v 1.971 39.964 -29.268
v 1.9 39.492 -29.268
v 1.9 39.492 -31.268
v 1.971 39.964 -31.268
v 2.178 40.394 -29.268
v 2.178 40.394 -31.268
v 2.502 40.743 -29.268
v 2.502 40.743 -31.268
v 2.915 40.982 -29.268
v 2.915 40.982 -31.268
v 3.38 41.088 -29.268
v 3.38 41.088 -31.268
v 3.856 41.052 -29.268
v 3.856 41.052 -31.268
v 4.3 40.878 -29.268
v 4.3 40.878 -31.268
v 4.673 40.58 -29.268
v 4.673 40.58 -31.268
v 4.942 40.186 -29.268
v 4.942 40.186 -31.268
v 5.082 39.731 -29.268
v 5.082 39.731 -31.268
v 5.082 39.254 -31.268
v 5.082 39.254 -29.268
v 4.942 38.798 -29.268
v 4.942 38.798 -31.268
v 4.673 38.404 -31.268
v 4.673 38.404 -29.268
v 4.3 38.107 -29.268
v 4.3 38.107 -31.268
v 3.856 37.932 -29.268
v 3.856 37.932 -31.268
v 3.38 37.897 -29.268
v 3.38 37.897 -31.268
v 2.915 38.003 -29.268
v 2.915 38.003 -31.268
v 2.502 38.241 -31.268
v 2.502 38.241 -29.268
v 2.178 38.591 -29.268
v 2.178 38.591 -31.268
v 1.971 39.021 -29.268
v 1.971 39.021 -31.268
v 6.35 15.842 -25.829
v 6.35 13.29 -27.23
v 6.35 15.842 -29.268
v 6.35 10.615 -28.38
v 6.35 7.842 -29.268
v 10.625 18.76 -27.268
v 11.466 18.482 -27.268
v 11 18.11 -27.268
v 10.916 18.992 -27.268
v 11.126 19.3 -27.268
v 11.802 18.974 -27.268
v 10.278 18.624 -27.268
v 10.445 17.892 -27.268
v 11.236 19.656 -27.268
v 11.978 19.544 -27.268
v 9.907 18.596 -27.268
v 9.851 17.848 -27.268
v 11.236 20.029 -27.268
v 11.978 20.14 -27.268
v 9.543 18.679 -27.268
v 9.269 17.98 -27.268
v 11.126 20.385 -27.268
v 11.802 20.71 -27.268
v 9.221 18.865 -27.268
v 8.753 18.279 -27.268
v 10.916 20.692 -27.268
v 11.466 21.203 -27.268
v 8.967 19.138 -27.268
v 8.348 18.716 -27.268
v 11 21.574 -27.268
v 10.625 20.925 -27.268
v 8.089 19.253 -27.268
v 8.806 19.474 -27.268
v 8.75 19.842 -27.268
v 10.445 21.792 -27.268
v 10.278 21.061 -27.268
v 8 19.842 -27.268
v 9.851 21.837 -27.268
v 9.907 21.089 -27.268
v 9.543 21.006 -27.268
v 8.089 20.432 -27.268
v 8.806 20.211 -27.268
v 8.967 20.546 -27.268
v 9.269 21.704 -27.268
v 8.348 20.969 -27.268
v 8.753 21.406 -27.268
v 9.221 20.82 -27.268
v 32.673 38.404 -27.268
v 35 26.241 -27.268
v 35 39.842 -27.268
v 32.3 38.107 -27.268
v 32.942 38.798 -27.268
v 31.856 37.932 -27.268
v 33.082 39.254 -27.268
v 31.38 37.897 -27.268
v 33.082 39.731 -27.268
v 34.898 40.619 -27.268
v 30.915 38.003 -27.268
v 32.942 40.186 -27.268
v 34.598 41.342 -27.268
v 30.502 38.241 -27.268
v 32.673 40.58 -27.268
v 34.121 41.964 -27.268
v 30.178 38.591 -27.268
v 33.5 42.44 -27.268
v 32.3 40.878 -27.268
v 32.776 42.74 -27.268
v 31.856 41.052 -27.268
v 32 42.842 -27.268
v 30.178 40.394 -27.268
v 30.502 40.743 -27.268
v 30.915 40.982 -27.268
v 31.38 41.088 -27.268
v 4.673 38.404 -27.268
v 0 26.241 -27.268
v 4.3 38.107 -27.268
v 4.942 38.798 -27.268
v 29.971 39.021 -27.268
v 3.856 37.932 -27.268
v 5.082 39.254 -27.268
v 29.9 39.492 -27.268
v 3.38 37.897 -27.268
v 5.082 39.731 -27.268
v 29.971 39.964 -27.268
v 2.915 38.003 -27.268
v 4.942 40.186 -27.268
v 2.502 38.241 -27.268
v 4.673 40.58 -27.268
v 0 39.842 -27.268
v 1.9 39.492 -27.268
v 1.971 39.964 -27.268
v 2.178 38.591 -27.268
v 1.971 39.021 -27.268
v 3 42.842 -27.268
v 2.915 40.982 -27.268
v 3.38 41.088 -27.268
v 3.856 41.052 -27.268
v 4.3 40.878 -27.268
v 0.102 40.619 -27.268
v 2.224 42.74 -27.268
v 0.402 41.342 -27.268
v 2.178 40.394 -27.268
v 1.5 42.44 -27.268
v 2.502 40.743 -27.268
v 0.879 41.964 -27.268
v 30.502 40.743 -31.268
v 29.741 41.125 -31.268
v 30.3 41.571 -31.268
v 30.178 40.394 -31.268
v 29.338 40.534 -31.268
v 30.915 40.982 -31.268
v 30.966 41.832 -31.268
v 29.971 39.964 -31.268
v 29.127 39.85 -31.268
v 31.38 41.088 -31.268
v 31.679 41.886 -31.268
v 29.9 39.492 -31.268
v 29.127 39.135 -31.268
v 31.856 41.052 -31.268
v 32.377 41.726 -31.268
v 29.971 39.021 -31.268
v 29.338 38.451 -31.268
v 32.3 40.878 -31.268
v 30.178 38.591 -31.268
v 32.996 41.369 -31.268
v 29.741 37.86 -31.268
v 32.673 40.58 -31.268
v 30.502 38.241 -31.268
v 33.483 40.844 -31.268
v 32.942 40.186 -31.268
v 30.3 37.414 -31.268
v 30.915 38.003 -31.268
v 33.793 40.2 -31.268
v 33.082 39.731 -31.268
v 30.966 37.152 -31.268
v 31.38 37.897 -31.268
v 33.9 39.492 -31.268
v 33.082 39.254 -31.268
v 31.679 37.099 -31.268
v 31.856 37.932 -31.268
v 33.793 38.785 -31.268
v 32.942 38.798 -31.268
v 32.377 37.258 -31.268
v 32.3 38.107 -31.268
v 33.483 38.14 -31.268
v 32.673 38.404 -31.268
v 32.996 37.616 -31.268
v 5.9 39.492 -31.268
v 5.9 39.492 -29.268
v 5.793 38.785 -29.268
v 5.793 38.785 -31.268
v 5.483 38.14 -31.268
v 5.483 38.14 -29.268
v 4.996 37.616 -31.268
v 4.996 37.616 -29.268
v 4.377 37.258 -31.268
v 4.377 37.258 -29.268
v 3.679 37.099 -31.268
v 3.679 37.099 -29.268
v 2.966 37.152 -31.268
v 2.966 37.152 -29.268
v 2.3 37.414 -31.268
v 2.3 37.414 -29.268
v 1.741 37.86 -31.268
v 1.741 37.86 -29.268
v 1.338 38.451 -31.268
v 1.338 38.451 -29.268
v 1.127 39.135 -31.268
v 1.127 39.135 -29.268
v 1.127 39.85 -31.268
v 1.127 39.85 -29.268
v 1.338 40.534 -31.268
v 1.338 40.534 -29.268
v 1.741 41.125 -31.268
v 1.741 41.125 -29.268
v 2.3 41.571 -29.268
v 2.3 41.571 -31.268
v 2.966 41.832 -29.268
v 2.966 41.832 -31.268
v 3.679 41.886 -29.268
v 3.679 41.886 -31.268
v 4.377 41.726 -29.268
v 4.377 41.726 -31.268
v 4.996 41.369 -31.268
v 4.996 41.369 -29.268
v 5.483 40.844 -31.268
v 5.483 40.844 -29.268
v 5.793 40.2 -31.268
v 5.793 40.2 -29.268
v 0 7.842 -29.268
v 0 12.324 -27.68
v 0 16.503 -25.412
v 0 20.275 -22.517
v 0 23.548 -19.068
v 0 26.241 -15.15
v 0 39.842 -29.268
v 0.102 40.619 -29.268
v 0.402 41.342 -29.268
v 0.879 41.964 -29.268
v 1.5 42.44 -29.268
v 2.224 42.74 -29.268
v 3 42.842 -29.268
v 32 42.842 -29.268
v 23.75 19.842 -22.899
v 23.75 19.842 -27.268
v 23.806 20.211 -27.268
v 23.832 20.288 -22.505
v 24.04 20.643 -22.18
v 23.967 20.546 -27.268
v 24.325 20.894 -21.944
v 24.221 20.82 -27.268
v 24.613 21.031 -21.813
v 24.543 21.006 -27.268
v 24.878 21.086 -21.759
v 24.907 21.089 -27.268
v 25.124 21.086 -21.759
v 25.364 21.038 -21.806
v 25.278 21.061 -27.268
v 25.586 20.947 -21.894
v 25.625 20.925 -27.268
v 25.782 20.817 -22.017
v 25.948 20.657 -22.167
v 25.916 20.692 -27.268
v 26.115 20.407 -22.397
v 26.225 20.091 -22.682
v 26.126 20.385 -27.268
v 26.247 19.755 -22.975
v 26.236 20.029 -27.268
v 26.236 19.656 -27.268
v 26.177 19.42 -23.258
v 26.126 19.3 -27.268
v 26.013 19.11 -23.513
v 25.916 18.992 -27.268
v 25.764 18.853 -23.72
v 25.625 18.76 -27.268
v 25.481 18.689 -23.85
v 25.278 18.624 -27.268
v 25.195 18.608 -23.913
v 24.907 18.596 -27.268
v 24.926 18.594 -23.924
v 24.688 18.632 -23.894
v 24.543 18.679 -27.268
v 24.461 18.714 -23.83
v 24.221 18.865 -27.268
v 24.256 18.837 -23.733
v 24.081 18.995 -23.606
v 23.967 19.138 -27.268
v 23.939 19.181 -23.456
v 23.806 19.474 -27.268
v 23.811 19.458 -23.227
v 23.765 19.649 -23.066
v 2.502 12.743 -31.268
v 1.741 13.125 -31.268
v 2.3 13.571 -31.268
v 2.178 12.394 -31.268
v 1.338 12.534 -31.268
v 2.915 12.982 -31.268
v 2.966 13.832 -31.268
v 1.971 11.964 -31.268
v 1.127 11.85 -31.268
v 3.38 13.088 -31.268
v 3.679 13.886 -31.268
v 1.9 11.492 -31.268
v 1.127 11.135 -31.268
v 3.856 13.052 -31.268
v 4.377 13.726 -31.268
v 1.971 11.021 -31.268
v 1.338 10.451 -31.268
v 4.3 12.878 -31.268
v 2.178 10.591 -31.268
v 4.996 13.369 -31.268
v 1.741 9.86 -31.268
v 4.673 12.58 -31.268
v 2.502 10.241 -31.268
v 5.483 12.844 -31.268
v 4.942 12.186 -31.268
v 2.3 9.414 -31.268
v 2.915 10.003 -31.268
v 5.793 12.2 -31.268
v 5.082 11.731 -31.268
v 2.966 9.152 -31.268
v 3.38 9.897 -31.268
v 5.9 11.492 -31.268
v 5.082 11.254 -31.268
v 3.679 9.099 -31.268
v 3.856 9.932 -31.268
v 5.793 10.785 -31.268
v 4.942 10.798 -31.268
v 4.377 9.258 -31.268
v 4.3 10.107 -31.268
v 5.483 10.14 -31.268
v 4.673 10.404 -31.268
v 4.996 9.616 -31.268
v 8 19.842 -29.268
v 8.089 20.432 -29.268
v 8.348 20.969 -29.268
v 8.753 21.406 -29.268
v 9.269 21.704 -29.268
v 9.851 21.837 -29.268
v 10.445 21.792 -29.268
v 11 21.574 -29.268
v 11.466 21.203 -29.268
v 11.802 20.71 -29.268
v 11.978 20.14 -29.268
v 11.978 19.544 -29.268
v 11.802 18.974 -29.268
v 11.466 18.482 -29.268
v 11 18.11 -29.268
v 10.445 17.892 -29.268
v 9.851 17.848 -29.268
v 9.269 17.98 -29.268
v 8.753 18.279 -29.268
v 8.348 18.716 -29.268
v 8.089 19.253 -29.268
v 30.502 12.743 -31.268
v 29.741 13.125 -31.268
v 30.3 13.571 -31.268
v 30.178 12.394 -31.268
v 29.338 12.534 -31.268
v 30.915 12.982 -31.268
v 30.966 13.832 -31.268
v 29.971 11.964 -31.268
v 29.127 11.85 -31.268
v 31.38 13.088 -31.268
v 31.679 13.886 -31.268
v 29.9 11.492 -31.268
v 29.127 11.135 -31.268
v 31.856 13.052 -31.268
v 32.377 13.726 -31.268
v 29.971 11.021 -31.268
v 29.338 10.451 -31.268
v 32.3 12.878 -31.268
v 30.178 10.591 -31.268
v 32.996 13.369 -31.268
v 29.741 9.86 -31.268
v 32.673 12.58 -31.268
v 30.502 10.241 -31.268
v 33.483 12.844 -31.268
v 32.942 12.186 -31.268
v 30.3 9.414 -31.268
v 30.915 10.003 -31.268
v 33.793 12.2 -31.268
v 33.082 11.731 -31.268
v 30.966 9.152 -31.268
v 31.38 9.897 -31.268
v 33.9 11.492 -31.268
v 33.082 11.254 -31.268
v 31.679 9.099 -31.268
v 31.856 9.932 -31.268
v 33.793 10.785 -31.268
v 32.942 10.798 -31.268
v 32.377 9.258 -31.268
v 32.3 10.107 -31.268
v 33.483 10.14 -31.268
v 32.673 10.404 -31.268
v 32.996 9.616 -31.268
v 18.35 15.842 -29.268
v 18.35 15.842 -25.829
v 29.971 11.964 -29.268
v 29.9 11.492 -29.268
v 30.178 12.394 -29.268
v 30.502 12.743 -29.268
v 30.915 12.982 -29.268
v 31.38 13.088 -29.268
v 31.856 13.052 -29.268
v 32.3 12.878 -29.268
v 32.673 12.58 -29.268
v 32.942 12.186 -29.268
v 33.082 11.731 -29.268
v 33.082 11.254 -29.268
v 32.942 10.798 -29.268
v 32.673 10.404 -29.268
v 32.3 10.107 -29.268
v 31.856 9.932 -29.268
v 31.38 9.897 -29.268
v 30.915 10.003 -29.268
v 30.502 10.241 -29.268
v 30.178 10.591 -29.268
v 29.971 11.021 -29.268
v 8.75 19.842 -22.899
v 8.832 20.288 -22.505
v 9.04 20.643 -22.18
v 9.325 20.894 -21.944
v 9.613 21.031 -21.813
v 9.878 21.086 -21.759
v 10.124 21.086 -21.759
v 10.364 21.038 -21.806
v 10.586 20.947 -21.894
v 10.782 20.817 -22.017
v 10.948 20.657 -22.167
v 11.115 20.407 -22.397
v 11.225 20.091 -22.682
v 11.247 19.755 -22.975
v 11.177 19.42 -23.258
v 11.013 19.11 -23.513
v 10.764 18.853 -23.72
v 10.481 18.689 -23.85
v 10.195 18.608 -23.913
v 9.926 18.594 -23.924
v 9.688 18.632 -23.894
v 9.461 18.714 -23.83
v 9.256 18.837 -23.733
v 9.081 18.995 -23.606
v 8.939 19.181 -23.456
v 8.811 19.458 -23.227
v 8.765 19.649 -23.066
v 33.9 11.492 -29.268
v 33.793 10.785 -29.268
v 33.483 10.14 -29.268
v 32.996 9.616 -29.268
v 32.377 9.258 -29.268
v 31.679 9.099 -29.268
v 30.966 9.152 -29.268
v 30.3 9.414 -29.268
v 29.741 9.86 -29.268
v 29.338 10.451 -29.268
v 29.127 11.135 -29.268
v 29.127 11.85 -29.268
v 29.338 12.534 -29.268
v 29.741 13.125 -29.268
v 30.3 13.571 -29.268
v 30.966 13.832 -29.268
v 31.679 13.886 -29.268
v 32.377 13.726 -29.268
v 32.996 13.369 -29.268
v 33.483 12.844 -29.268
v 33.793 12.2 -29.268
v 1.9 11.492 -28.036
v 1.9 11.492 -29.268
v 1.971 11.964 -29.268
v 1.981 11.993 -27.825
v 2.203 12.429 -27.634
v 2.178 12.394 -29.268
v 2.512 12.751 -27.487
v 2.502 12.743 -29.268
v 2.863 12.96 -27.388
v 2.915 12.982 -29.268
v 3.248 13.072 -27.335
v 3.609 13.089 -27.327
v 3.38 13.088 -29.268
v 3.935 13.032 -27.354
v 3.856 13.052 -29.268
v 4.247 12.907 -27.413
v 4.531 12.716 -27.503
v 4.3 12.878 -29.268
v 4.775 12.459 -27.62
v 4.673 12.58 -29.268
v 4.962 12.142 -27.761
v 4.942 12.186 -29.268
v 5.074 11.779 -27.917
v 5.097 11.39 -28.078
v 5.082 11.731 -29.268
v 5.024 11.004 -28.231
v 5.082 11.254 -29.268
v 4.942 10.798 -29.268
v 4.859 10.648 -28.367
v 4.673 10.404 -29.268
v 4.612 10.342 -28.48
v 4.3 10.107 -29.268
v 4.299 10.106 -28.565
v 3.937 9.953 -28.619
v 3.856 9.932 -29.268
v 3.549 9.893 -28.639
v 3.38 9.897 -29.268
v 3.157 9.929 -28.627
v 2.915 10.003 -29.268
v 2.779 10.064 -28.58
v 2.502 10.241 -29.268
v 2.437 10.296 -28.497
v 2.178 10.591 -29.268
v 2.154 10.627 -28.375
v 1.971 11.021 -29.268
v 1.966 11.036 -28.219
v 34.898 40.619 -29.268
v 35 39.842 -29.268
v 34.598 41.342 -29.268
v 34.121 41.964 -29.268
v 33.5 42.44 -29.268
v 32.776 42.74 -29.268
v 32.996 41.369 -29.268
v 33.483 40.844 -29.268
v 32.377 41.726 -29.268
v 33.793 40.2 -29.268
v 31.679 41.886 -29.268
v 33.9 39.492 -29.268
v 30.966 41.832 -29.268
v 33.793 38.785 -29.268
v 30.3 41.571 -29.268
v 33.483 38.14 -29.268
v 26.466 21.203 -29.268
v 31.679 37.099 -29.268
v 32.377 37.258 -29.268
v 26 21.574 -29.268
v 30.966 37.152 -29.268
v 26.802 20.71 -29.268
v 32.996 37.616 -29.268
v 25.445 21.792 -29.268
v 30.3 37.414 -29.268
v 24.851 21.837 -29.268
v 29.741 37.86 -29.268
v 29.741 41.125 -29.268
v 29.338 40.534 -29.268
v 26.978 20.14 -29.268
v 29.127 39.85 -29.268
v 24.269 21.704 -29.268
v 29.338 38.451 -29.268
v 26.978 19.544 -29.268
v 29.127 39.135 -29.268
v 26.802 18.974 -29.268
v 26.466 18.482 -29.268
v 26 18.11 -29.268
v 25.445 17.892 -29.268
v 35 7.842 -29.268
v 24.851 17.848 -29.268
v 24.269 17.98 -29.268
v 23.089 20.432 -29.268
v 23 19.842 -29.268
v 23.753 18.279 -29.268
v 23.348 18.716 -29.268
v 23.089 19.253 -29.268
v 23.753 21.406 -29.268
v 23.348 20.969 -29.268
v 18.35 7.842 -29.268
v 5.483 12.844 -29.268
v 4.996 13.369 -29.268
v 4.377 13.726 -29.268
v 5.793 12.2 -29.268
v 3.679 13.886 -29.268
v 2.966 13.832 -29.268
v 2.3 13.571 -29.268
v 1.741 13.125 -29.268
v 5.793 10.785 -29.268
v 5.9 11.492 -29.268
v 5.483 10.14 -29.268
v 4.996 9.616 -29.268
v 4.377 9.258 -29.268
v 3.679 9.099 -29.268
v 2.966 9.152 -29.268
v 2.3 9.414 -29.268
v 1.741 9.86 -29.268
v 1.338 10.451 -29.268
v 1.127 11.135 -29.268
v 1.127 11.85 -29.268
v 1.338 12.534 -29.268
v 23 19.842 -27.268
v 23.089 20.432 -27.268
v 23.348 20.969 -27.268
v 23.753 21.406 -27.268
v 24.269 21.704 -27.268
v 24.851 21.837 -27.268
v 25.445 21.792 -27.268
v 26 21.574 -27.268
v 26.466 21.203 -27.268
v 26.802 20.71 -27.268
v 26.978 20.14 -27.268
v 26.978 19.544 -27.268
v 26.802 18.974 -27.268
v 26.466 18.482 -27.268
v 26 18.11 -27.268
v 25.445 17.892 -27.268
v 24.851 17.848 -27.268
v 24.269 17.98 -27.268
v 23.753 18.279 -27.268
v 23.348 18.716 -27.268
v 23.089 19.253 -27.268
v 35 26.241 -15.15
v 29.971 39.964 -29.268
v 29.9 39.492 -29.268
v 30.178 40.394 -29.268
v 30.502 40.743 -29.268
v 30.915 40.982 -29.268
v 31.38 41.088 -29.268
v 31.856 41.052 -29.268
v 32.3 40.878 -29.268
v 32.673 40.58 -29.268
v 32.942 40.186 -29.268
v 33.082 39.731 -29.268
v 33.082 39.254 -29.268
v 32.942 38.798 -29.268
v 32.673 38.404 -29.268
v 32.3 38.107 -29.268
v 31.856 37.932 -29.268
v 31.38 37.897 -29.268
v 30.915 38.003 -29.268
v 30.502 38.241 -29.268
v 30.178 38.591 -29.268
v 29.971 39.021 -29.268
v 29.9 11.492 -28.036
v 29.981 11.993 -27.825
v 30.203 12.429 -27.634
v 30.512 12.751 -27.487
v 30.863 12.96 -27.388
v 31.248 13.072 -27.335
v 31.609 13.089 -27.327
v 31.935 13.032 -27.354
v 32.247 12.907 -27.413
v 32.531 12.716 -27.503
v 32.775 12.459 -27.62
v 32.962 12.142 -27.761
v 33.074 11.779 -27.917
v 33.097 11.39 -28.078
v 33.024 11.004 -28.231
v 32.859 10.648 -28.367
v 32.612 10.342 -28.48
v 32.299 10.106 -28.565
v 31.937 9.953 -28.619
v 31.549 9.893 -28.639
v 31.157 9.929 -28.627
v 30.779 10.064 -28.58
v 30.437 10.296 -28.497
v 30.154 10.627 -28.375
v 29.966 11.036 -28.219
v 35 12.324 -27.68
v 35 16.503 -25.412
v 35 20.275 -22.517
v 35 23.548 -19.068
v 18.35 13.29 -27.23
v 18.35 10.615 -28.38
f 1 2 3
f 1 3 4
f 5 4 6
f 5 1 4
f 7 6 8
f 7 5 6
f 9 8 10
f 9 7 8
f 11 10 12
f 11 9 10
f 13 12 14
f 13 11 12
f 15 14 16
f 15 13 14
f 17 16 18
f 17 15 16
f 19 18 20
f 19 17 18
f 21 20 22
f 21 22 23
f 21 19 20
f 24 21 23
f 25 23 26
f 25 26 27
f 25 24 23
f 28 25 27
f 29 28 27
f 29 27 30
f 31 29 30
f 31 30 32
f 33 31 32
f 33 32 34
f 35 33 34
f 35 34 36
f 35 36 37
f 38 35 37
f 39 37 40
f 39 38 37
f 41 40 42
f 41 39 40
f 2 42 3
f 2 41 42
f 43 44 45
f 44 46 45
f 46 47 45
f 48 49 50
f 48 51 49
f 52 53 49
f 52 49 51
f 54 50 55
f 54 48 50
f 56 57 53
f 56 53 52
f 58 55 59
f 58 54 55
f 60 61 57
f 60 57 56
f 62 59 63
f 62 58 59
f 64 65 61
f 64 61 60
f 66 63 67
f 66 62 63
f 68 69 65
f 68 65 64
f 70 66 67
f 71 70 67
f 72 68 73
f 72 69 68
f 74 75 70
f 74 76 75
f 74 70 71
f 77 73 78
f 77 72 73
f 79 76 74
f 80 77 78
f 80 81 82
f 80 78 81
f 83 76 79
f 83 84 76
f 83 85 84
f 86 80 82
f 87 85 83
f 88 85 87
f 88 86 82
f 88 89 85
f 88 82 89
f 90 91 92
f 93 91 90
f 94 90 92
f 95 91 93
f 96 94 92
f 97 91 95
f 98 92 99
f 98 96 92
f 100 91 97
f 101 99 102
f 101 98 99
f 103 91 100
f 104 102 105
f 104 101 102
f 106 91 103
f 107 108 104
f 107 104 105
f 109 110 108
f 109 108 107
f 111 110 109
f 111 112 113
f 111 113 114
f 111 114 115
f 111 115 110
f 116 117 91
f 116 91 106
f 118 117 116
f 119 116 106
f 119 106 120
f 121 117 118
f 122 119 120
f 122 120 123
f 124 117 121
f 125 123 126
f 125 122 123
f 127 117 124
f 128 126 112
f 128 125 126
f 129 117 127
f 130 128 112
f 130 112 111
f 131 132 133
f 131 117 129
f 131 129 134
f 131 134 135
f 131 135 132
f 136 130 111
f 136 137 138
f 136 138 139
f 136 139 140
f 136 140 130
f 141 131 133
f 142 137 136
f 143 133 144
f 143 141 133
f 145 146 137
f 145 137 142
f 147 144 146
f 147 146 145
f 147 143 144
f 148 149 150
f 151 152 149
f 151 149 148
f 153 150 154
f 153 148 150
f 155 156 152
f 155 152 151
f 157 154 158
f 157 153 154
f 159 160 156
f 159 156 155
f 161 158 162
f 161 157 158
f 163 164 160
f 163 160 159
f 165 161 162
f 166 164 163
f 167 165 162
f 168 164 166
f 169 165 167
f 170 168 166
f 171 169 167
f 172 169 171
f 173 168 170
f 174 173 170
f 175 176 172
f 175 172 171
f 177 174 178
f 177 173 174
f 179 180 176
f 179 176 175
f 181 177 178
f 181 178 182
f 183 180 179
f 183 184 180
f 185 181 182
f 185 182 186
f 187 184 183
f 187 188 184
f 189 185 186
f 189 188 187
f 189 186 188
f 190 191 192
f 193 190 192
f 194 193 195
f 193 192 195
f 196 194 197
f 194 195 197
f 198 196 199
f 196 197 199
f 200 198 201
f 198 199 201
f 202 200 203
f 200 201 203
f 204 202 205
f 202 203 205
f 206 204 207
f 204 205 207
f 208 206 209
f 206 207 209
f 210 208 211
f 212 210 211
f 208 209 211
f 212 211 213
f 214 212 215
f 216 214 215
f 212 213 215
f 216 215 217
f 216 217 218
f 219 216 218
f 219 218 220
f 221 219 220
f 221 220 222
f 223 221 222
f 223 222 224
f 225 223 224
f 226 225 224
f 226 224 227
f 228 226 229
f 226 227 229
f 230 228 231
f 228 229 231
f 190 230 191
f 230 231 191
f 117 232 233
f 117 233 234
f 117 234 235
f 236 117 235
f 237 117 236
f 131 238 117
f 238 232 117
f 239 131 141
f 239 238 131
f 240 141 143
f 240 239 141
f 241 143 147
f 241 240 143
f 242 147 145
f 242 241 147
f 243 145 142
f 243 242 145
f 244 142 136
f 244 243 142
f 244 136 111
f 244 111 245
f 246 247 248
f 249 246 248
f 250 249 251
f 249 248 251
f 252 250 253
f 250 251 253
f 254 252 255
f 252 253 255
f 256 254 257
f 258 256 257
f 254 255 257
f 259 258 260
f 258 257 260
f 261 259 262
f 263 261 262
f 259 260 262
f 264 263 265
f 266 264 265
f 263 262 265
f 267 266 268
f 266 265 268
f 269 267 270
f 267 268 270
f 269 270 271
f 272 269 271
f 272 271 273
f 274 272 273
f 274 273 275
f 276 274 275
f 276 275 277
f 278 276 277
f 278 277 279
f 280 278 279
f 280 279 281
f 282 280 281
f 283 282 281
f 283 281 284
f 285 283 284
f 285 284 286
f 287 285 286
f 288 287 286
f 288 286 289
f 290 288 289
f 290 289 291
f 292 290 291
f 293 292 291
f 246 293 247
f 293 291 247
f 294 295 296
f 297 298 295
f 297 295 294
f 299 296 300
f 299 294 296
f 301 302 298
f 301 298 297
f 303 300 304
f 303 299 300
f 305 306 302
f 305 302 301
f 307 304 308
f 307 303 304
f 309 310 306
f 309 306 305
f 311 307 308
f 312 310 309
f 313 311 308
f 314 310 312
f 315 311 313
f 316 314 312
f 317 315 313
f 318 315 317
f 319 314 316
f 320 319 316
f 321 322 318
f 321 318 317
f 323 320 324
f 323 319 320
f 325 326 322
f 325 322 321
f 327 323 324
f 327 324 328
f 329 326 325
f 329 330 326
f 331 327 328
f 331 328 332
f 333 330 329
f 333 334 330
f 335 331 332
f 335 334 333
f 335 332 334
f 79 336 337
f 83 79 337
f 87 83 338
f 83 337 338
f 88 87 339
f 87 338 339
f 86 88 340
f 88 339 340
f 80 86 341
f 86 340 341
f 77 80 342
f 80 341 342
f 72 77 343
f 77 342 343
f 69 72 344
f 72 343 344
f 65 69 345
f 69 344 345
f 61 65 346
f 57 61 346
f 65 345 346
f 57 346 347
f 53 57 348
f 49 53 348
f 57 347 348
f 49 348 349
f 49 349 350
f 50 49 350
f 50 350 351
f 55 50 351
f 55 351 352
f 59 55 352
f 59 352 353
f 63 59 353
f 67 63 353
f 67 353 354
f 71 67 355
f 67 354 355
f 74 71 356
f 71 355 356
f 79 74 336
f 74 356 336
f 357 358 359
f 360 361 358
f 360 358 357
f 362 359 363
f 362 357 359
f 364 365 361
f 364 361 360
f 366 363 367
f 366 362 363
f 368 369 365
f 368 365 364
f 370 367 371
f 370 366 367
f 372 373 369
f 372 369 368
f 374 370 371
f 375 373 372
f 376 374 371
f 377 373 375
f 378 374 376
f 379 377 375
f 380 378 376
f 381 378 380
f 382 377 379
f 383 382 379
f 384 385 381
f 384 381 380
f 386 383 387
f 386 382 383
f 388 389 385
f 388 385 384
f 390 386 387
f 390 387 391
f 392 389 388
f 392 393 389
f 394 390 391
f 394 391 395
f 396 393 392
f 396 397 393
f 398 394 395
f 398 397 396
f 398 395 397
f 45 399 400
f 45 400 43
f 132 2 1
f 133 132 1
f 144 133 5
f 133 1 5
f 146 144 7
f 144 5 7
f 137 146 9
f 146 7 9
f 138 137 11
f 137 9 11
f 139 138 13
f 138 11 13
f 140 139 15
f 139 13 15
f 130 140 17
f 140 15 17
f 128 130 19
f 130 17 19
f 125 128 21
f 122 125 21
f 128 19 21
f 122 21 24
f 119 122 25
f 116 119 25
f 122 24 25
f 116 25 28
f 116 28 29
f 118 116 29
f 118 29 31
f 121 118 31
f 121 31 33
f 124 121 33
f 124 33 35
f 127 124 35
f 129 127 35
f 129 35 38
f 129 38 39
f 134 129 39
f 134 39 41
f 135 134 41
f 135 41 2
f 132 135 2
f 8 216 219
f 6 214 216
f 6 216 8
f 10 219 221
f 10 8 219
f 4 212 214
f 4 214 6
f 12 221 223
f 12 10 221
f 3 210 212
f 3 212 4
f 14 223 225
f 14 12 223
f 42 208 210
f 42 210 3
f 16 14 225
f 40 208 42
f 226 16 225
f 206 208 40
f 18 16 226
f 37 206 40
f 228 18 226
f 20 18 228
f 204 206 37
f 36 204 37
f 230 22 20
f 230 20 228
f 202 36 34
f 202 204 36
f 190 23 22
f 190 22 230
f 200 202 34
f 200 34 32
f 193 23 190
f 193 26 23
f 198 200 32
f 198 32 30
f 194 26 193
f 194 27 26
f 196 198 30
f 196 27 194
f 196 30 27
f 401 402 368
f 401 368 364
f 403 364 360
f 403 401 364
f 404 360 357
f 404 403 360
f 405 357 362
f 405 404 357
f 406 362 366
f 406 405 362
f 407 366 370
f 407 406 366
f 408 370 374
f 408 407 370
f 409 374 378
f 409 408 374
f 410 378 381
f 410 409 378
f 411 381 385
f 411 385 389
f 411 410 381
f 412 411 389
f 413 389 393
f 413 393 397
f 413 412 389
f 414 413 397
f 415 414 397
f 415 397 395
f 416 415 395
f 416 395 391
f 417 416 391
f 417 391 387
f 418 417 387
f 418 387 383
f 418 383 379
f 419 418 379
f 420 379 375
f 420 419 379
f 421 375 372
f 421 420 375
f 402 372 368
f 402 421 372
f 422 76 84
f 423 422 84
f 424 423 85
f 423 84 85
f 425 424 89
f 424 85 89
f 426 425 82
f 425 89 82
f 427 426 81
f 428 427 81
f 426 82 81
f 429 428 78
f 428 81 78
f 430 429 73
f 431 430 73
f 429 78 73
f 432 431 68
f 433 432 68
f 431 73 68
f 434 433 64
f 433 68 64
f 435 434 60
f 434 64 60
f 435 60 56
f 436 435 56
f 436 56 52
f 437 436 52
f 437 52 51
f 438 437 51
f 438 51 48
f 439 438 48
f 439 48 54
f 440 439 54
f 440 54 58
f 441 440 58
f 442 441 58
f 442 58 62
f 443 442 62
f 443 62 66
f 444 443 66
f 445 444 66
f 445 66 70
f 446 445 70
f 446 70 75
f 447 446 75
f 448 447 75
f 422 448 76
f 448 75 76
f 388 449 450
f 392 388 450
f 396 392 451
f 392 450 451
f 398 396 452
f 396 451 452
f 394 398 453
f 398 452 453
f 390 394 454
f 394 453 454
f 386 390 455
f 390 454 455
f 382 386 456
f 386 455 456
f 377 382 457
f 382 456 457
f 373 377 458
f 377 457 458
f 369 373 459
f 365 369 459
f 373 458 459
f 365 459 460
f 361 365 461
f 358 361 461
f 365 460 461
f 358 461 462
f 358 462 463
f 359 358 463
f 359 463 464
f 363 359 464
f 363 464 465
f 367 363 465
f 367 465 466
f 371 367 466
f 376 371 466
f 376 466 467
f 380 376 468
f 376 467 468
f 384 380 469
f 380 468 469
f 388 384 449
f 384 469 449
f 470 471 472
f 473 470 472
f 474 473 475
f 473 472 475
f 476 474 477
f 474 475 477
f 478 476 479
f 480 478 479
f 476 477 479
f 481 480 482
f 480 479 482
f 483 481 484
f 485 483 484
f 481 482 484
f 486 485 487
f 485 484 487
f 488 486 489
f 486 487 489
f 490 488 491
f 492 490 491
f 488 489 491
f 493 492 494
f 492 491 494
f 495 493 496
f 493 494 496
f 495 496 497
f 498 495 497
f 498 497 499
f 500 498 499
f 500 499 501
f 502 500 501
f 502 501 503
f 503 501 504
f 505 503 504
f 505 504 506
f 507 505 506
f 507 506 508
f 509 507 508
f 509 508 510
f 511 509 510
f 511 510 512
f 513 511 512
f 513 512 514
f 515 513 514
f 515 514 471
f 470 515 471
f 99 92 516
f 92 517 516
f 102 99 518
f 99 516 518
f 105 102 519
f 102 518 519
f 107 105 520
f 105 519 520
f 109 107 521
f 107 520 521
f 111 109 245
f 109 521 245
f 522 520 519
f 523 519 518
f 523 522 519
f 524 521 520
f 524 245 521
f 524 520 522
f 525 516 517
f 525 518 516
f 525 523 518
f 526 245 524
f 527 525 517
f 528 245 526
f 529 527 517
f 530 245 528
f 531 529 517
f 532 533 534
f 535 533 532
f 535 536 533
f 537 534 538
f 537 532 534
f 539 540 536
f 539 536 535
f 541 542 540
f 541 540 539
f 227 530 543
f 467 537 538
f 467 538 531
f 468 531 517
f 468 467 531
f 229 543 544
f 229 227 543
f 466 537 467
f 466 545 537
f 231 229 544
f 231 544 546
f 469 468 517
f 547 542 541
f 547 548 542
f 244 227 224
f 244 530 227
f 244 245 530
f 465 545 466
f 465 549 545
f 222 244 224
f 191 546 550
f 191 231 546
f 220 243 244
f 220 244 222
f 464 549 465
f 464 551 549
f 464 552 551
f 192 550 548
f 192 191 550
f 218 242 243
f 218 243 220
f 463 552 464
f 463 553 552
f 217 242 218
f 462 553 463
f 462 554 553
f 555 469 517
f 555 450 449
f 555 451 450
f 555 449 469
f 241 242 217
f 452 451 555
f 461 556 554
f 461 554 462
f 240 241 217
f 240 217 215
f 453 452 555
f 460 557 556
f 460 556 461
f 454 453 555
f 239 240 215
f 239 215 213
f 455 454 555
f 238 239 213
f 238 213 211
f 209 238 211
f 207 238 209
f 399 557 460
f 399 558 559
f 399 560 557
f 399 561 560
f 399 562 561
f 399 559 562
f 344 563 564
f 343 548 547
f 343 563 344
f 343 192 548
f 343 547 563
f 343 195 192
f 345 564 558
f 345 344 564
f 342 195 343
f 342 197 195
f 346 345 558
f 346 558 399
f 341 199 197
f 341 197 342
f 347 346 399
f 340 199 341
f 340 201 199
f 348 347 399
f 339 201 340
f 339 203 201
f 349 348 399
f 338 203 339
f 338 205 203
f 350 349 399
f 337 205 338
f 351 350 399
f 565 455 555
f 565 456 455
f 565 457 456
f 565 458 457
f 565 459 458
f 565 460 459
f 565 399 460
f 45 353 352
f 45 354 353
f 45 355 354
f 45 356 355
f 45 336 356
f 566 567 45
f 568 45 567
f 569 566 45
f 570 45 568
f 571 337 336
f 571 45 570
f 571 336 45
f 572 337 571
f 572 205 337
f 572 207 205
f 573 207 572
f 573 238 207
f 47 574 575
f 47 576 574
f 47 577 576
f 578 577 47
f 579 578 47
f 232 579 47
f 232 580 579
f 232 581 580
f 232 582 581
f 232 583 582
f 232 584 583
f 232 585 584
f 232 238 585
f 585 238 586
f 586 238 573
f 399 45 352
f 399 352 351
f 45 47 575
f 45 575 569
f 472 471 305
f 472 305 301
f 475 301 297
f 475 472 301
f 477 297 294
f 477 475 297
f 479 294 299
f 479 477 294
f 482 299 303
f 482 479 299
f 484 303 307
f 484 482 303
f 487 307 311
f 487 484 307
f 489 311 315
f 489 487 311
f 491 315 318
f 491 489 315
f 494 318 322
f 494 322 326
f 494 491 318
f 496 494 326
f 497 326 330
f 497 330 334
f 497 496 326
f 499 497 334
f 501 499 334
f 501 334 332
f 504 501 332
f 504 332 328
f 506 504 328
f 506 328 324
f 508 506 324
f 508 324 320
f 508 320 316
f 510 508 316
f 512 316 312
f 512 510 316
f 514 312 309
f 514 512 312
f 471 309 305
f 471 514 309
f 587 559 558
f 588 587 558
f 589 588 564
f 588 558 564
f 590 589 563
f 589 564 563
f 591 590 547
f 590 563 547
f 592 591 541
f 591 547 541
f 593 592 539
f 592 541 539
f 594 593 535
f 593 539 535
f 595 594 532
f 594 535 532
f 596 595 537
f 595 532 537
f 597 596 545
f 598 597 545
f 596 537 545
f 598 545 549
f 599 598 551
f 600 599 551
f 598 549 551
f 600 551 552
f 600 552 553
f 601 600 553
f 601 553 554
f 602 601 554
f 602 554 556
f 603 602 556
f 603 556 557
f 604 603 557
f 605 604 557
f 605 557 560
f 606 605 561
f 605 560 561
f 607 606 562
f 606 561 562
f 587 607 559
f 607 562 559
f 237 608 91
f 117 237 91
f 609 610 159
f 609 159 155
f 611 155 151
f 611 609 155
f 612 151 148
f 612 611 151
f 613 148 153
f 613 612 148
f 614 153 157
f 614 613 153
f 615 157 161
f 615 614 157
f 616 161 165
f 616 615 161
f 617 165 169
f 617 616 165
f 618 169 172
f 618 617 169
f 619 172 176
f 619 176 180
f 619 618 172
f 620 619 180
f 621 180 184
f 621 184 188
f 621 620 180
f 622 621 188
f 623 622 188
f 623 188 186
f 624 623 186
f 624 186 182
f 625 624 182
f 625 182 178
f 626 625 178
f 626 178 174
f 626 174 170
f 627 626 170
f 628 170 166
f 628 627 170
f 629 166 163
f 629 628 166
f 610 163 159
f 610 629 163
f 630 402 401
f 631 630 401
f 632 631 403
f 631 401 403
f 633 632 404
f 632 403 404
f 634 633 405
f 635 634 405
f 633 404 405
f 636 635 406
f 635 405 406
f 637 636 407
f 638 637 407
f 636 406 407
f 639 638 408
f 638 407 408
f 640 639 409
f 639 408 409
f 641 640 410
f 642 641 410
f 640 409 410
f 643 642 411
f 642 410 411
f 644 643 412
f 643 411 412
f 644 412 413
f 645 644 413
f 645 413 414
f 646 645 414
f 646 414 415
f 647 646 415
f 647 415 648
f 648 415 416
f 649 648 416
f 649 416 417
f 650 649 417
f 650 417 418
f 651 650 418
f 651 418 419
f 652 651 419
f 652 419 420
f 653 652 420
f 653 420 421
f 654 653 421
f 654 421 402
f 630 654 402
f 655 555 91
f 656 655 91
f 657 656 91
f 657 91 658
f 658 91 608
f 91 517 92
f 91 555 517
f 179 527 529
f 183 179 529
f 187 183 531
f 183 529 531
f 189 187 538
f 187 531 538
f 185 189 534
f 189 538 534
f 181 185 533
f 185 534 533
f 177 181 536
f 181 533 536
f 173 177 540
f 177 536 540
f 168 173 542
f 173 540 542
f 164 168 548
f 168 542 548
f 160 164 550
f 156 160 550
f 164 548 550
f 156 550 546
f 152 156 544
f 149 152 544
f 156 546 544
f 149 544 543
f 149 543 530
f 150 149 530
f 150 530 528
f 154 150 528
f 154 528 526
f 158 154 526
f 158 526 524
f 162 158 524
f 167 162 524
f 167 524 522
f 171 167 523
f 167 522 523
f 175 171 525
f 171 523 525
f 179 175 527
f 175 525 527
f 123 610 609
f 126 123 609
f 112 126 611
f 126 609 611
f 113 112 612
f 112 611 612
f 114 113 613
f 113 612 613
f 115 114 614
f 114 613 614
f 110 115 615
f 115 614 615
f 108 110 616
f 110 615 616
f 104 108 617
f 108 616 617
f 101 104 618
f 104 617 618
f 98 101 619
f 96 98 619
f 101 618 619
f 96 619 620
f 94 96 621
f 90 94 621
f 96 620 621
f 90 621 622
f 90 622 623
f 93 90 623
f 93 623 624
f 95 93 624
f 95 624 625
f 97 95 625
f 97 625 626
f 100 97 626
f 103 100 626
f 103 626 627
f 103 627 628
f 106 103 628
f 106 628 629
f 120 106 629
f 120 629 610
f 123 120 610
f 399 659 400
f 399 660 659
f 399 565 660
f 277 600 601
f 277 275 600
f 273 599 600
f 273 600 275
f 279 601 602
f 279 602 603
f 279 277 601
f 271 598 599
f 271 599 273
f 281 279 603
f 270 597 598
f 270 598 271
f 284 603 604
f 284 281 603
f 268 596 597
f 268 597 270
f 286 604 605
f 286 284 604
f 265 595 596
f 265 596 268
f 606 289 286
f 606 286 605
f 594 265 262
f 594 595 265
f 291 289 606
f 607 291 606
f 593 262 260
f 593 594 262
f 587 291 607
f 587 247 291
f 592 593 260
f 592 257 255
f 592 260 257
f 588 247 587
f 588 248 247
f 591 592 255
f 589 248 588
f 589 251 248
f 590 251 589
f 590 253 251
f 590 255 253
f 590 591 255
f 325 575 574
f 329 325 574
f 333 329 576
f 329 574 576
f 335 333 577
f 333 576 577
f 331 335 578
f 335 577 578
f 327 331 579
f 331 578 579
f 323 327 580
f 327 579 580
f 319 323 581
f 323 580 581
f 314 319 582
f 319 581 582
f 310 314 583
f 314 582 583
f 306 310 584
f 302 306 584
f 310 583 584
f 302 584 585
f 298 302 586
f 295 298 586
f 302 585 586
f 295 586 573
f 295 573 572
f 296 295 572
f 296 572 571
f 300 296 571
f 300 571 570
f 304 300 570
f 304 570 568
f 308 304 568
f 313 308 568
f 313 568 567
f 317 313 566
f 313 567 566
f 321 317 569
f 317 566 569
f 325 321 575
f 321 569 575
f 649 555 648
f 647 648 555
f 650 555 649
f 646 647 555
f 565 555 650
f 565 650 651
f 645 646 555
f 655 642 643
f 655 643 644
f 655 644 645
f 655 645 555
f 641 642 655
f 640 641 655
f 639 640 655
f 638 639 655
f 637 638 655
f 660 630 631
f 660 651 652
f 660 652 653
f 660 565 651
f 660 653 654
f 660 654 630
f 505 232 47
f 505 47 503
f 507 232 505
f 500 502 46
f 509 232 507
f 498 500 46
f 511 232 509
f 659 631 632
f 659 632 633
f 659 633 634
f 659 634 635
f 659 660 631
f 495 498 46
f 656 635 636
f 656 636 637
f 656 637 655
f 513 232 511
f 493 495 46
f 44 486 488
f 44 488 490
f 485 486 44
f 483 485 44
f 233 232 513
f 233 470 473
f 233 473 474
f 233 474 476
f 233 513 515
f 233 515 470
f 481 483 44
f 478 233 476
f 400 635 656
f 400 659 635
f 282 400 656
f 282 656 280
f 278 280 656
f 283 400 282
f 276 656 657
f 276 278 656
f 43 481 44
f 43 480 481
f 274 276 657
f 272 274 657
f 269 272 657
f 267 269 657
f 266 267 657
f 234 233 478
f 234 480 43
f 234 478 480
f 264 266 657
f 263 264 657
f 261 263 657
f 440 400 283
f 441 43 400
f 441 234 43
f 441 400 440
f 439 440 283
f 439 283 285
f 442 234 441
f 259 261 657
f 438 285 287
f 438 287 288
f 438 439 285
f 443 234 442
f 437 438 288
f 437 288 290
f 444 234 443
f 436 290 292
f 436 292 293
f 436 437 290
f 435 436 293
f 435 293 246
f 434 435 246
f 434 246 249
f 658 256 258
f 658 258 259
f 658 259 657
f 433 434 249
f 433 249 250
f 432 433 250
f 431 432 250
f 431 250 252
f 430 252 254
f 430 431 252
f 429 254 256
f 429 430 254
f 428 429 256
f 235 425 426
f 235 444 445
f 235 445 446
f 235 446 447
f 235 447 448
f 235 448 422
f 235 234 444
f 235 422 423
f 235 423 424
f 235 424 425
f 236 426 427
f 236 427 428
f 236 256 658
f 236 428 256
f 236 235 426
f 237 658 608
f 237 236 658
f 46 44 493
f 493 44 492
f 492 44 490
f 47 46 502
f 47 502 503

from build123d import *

# Parameters (mm, degrees)
SALIENTE_EXTRUIR1_DEPTH = 35
CROQUIS4_R              = 2
CORTAR_EXTRUIR1_DEPTH   = 2
CROQUIS5_R              = 1.25
CORTAR_EXTRUIR2_DEPTH   = 57.632946618
CROQUIS6_W              = 12
CROQUIS6_H              = 8
CORTAR_EXTRUIR3_DEPTH   = 58.094315502
CROQUIS7_R              = 2.4
CROQUIS7_R_2            = 1.6
SALIENTE_EXTRUIR3_DEPTH = 2
CROQUIS10_R             = 1.6
CORTAR_EXTRUIR6_DEPTH   = 58.094315502
REDONDEO1_R             = 3


with BuildPart() as part:
    # Croquis3 → Saliente-Extruir1 (new body)
    with BuildSketch(Plane(origin=(0, 0, 0), x_dir=(0, 0, -1), z_dir=(1, 0, 0))):
        with BuildLine():
            Line((15.15, 26.240569735), (27.267552537, 26.240569735))
            Line((27.267552537, 26.240569735), (27.267552537, 42.842217067))
            Line((27.267552537, 42.842217067), (29.267552537, 42.842217067))
            Line((29.267552537, 42.842217067), (29.267552537, 7.842217067))
            ThreePointArc((29.267552537, 7.842217067), (24.038606211, 18.445471299), (15.15, 26.240569735))
        make_face()
    extrude(amount=SALIENTE_EXTRUIR1_DEPTH)

    # Croquis4 → Cortar-Extruir1 (cut)
    with BuildSketch(Plane(origin=(0, 0, -29.267552537), x_dir=(-1, 0, 0), z_dir=(0, 0, -1))):
        with Locations((-25, 19.842217067)):
            Circle(CROQUIS4_R)
        with Locations((-10, 19.842217067)):
            Circle(CROQUIS4_R)
    extrude(amount=-CORTAR_EXTRUIR1_DEPTH, mode=Mode.SUBTRACT)

    # Croquis5 → Cortar-Extruir2 (cut, through all)
    with BuildSketch(Plane(origin=(0, 0, -27.267552537), x_dir=(-1, 0, 0), z_dir=(0, 0, -1))):
        with Locations((-25, 19.842217067)):
            Circle(CROQUIS5_R)
        with Locations((-10, 19.842217067)):
            Circle(CROQUIS5_R)
    extrude(amount=-CORTAR_EXTRUIR2_DEPTH, mode=Mode.SUBTRACT)

    # Croquis6 → Cortar-Extruir3 (cut, through all)
    with BuildSketch(Plane(origin=(0, 0, -29.267552537), x_dir=(-1, 0, 0), z_dir=(0, 0, -1))):
        with Locations((-12.35, 11.842217067)):
            Rectangle(CROQUIS6_W, CROQUIS6_H)
    extrude(amount=-CORTAR_EXTRUIR3_DEPTH, mode=Mode.SUBTRACT)

    # Croquis7 → Saliente-Extruir3 (add)
    # profile 1 of 4: a face of its own
    with BuildSketch(Plane(origin=(0, 0, -29.267552537), x_dir=(-1, 0, 0), z_dir=(0, 0, -1))):
        with Locations(Location((-31.5, 39.492217067, 0), (0, 0, 180))):
            Circle(CROQUIS7_R)
        with Locations((-31.5, 39.492217067)):
            Circle(CROQUIS7_R_2, mode=Mode.SUBTRACT)
    # profile 2 of 4: a face of its own
    with BuildSketch(Plane(origin=(0, 0, -29.267552537), x_dir=(-1, 0, 0), z_dir=(0, 0, -1))):
        with Locations(Location((-3.5, 39.492217067, 0), (0, 0, 180))):
            Circle(CROQUIS7_R)
        with Locations((-3.5, 39.492217067)):
            Circle(CROQUIS7_R_2, mode=Mode.SUBTRACT)
    # profile 3 of 4: a face of its own
    with BuildSketch(Plane(origin=(0, 0, -29.267552537), x_dir=(-1, 0, 0), z_dir=(0, 0, -1))):
        with Locations(Location((-3.5, 11.492217067, 0), (0, 0, 180))):
            Circle(CROQUIS7_R)
        with Locations((-3.5, 11.492217067)):
            Circle(CROQUIS7_R_2, mode=Mode.SUBTRACT)
    # profile 4 of 4: a face of its own
    with BuildSketch(Plane(origin=(0, 0, -29.267552537), x_dir=(-1, 0, 0), z_dir=(0, 0, -1))):
        with Locations(Location((-31.5, 11.492217067, 0), (0, 0, 180))):
            Circle(CROQUIS7_R)
        with Locations((-31.5, 11.492217067)):
            Circle(CROQUIS7_R_2, mode=Mode.SUBTRACT)
    extrude(amount=SALIENTE_EXTRUIR3_DEPTH)

    # Croquis10 → Cortar-Extruir6 (cut, through all)
    with BuildSketch(Plane(origin=(0, 0, -29.267552537), x_dir=(-1, 0, 0), z_dir=(0, 0, -1))):
        with Locations((-31.5, 11.492217067)):
            Circle(CROQUIS10_R)
        with Locations((-3.5, 11.492217067)):
            Circle(CROQUIS10_R)
        with Locations((-3.5, 39.492217067)):
            Circle(CROQUIS10_R)
        with Locations((-31.5, 39.492217067)):
            Circle(CROQUIS10_R)
    extrude(amount=-CORTAR_EXTRUIR6_DEPTH, mode=Mode.SUBTRACT)

    # Redondeo1
    redondeo1_edges = [part.edges().sort_by_distance(p)[0] for p in [
        (35, 42.842217067, -28.267552537),
        (0, 42.842217067, -28.267552537),
    ]]
    fillet(redondeo1_edges, radius=REDONDEO1_R)


solid = part.part
